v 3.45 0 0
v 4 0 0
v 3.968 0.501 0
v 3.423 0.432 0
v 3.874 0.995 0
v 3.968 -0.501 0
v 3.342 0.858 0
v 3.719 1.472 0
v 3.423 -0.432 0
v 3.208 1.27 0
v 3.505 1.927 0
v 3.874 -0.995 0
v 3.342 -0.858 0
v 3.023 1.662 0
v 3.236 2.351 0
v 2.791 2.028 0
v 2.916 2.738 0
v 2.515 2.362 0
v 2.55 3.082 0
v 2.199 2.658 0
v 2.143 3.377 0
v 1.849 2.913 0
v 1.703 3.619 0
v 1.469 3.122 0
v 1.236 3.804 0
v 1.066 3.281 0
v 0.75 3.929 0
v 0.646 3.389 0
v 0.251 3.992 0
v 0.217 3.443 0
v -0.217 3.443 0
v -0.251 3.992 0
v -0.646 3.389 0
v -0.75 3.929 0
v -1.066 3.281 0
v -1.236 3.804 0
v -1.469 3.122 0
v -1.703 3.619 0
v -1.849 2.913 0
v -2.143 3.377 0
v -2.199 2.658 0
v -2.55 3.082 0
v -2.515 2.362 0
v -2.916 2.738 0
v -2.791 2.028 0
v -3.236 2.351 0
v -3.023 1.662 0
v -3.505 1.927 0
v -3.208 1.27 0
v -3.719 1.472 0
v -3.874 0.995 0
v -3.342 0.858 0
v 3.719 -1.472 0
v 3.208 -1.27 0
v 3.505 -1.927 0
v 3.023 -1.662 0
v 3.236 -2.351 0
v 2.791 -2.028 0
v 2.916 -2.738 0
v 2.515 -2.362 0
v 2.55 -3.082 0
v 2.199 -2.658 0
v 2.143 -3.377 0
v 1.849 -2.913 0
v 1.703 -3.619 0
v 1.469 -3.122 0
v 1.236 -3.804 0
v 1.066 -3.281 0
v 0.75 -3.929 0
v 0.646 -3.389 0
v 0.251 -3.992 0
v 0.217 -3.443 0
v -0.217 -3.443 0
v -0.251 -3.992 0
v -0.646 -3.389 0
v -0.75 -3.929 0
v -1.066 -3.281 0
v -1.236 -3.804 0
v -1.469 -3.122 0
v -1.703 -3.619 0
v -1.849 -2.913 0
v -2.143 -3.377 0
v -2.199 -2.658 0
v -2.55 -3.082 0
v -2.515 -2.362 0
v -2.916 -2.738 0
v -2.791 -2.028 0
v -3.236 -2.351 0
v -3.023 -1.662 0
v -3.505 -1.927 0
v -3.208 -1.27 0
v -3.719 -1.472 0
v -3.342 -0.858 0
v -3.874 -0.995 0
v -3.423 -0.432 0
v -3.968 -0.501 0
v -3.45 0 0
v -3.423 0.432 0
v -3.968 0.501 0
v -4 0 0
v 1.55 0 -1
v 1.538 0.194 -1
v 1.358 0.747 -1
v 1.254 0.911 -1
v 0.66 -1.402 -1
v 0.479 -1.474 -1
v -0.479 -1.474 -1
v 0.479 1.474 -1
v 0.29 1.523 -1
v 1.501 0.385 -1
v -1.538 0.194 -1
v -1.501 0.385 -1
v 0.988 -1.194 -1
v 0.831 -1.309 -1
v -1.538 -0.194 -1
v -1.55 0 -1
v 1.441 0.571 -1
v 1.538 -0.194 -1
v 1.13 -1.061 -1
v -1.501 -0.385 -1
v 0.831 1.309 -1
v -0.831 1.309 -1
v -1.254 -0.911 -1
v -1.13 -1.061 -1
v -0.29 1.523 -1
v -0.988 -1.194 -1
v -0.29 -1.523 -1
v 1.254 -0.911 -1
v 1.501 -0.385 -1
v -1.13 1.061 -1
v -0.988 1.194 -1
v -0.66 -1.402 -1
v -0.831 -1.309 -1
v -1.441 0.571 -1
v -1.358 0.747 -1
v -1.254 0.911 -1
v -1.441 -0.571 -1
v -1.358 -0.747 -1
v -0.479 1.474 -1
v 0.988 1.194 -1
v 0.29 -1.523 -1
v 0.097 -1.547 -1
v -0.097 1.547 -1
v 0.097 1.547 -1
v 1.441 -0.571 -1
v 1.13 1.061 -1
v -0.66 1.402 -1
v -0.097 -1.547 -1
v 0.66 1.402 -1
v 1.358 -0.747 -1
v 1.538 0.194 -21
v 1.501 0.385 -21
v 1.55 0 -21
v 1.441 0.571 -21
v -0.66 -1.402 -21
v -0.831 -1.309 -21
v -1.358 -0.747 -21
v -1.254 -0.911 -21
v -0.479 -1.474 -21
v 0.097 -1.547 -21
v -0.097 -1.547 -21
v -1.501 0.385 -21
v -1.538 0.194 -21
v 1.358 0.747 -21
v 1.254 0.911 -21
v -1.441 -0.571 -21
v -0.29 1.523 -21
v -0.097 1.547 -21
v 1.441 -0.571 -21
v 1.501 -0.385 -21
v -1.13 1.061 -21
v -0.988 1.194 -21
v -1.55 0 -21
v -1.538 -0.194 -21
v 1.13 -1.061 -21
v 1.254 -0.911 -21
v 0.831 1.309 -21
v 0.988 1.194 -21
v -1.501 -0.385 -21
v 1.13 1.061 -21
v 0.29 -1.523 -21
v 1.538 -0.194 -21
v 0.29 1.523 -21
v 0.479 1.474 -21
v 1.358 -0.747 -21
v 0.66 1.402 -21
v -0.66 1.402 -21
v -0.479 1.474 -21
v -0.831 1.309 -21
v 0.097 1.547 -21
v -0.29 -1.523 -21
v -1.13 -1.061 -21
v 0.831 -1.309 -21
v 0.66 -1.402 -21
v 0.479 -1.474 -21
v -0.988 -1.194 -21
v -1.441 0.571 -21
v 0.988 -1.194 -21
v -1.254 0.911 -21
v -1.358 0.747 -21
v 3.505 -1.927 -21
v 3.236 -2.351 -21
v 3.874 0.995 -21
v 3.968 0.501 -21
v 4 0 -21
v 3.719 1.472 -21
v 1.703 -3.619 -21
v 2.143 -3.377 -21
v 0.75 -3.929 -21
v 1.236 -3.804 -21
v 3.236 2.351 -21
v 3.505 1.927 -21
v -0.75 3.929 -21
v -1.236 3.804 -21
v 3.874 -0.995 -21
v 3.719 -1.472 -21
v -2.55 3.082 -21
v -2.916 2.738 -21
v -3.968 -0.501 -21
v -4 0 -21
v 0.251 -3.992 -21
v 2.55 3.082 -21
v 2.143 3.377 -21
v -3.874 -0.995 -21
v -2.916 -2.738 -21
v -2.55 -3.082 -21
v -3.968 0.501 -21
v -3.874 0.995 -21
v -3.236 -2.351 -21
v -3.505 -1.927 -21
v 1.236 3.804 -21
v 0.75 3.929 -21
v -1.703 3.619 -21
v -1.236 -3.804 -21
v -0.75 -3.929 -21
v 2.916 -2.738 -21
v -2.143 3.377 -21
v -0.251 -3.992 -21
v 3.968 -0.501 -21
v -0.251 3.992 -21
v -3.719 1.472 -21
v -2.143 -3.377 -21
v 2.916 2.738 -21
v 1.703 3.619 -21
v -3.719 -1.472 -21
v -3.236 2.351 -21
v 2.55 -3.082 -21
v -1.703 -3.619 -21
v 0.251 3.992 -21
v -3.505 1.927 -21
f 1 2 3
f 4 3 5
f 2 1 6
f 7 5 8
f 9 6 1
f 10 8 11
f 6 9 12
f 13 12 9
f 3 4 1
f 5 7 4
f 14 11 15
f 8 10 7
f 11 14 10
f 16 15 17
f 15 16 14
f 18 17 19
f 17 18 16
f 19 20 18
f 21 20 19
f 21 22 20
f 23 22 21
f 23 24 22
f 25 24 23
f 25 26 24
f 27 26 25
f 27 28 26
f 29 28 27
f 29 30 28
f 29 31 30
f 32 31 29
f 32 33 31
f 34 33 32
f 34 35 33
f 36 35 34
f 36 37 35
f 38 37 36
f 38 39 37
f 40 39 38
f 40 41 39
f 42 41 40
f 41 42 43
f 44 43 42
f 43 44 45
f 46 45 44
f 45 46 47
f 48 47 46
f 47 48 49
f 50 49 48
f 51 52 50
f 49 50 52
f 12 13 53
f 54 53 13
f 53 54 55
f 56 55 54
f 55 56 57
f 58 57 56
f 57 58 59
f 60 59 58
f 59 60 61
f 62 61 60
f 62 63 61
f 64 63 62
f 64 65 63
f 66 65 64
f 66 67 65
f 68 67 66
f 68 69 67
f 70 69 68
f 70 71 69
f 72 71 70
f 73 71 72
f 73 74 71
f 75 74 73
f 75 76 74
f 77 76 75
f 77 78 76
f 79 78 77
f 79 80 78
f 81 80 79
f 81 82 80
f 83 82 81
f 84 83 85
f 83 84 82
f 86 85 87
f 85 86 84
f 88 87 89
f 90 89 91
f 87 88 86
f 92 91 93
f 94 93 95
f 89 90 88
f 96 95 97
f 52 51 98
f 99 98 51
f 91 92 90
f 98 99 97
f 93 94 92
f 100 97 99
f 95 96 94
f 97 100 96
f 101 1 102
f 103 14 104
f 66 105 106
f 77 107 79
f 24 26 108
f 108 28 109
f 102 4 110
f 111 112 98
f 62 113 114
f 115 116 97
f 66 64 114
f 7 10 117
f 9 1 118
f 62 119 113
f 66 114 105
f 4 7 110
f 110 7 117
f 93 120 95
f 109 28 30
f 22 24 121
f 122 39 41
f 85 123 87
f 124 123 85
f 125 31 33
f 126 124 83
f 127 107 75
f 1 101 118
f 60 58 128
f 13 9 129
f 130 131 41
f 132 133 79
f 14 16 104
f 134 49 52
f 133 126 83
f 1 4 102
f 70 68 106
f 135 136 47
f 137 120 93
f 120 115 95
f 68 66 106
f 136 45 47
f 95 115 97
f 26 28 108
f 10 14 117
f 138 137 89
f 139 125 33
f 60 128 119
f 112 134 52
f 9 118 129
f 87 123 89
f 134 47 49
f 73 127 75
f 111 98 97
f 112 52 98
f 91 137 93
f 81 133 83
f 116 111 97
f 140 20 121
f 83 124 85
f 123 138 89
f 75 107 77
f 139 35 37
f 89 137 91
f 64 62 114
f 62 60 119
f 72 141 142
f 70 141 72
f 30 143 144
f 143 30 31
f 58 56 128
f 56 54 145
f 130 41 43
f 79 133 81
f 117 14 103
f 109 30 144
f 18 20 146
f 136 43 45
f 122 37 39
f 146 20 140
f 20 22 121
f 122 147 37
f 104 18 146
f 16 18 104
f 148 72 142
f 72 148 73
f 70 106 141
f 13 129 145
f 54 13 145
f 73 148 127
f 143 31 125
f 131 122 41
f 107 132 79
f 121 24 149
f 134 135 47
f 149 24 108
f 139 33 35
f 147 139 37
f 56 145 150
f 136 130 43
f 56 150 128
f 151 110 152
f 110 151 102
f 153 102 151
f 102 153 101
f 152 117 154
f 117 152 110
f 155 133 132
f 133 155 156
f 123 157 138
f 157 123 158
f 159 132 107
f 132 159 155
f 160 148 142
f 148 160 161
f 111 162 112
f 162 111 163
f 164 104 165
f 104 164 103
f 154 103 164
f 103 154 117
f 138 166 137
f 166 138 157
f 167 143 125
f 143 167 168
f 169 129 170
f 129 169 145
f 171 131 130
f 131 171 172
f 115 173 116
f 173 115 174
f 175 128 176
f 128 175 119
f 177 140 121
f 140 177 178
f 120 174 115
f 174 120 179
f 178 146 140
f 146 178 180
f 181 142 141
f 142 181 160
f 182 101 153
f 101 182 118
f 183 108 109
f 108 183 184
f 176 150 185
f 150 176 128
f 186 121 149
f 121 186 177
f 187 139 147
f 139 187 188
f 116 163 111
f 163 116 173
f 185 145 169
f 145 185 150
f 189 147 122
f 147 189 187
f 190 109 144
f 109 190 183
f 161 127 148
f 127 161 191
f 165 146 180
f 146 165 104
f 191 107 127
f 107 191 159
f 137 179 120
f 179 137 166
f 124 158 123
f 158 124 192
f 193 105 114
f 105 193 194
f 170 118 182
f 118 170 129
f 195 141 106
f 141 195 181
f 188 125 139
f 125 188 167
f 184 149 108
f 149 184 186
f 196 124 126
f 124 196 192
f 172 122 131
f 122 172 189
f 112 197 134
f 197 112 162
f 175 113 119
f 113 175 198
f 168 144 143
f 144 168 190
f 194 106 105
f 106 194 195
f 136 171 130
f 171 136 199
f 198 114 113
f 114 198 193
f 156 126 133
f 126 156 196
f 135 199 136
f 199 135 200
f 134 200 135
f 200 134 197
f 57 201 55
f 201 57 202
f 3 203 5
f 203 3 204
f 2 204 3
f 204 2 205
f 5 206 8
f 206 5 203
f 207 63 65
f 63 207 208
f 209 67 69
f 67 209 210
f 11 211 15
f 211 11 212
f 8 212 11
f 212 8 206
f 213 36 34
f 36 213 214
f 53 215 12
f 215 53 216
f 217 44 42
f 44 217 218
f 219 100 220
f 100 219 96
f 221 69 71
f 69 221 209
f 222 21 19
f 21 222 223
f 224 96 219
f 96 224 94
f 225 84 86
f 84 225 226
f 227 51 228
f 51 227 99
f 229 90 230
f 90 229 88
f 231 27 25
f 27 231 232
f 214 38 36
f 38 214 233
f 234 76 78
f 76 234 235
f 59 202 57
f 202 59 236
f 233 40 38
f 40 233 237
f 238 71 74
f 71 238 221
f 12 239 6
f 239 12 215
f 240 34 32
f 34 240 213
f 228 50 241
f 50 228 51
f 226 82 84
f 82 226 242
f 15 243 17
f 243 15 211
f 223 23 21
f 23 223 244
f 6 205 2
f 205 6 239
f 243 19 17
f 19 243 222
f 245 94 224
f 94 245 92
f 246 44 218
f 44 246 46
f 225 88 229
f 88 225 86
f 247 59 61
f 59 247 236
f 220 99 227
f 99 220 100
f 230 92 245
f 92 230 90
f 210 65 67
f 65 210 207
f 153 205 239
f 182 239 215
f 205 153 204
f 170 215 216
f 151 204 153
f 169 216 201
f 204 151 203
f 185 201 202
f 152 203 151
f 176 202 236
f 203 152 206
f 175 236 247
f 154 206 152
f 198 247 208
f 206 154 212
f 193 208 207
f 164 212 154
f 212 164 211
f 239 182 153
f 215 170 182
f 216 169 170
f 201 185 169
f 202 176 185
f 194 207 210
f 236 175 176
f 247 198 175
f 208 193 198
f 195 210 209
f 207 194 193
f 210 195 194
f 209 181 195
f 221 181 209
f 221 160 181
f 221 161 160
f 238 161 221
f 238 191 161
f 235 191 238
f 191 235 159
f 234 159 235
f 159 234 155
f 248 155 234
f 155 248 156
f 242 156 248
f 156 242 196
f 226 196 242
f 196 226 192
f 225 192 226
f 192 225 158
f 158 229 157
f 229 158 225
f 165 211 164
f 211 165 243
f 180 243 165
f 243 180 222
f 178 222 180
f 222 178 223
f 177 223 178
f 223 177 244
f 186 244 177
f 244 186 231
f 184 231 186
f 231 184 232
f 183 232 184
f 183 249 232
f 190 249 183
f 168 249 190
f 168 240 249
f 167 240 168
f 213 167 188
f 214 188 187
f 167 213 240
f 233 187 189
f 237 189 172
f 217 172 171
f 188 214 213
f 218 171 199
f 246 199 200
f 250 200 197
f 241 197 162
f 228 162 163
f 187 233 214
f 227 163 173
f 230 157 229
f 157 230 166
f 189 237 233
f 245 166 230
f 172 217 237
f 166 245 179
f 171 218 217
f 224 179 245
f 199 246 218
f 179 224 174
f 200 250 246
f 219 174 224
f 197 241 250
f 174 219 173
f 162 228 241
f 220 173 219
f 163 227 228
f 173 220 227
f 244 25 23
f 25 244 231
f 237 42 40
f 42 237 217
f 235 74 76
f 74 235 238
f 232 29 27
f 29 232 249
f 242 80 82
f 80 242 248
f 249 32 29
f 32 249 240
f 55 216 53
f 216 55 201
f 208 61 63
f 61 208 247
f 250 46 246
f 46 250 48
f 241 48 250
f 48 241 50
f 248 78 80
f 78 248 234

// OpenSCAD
$fn = 50;

difference() {
	union() {
		translate(v = [0, 0, -21.0]) {
			cylinder(h = 24, r = 4.0);
		}
	}
	union() {
		translate(v = [0, 0, 0]) {
			rotate(a = [0, 0, 0]) {
				difference() {
					union() {
						translate(v = [0, 0, -24.0]) {
							cylinder(h = 24, r = 1.25);
						}
						translate(v = [0, 0, -1.0]) {
							cylinder(h = 1.0, r1 = 1.55, r2 = 3.45);
						}
						translate(v = [0, 0, -24.0]) {
							cylinder(h = 24, r = 1.55);
						}
						translate(v = [0, 0, -24.0]) {
							cylinder(h = 24, r = 1.25);
						}
					}
					union();
				}
			}
		}
		#cylinder(h = 3, r = 5.0);
	}
}
